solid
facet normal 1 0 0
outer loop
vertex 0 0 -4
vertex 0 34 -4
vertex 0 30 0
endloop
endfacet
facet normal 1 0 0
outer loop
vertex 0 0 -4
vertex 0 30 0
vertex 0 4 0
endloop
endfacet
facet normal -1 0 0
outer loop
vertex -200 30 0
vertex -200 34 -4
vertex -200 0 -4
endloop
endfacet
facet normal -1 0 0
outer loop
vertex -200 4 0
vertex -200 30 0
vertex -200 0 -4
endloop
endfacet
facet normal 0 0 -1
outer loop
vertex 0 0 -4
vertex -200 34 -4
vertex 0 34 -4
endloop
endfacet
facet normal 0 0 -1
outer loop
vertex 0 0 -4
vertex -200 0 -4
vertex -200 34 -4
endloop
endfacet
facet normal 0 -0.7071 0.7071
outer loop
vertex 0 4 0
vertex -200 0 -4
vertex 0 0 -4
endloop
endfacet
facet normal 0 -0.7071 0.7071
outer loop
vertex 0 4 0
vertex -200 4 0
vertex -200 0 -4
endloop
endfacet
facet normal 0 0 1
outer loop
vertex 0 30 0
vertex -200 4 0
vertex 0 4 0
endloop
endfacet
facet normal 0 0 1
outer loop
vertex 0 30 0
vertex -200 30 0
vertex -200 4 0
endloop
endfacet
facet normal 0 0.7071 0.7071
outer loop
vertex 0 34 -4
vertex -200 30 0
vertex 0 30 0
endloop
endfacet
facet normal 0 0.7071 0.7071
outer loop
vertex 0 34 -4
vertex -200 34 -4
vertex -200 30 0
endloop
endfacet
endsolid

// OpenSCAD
module wedge(width = 30) {
    rotate([270, 0, 90]) linear_extrude(height=200)
    polygon(points=[[4, 0], [width, 0], [width + 4, 4], [0, 4]]);
}

wedge();
